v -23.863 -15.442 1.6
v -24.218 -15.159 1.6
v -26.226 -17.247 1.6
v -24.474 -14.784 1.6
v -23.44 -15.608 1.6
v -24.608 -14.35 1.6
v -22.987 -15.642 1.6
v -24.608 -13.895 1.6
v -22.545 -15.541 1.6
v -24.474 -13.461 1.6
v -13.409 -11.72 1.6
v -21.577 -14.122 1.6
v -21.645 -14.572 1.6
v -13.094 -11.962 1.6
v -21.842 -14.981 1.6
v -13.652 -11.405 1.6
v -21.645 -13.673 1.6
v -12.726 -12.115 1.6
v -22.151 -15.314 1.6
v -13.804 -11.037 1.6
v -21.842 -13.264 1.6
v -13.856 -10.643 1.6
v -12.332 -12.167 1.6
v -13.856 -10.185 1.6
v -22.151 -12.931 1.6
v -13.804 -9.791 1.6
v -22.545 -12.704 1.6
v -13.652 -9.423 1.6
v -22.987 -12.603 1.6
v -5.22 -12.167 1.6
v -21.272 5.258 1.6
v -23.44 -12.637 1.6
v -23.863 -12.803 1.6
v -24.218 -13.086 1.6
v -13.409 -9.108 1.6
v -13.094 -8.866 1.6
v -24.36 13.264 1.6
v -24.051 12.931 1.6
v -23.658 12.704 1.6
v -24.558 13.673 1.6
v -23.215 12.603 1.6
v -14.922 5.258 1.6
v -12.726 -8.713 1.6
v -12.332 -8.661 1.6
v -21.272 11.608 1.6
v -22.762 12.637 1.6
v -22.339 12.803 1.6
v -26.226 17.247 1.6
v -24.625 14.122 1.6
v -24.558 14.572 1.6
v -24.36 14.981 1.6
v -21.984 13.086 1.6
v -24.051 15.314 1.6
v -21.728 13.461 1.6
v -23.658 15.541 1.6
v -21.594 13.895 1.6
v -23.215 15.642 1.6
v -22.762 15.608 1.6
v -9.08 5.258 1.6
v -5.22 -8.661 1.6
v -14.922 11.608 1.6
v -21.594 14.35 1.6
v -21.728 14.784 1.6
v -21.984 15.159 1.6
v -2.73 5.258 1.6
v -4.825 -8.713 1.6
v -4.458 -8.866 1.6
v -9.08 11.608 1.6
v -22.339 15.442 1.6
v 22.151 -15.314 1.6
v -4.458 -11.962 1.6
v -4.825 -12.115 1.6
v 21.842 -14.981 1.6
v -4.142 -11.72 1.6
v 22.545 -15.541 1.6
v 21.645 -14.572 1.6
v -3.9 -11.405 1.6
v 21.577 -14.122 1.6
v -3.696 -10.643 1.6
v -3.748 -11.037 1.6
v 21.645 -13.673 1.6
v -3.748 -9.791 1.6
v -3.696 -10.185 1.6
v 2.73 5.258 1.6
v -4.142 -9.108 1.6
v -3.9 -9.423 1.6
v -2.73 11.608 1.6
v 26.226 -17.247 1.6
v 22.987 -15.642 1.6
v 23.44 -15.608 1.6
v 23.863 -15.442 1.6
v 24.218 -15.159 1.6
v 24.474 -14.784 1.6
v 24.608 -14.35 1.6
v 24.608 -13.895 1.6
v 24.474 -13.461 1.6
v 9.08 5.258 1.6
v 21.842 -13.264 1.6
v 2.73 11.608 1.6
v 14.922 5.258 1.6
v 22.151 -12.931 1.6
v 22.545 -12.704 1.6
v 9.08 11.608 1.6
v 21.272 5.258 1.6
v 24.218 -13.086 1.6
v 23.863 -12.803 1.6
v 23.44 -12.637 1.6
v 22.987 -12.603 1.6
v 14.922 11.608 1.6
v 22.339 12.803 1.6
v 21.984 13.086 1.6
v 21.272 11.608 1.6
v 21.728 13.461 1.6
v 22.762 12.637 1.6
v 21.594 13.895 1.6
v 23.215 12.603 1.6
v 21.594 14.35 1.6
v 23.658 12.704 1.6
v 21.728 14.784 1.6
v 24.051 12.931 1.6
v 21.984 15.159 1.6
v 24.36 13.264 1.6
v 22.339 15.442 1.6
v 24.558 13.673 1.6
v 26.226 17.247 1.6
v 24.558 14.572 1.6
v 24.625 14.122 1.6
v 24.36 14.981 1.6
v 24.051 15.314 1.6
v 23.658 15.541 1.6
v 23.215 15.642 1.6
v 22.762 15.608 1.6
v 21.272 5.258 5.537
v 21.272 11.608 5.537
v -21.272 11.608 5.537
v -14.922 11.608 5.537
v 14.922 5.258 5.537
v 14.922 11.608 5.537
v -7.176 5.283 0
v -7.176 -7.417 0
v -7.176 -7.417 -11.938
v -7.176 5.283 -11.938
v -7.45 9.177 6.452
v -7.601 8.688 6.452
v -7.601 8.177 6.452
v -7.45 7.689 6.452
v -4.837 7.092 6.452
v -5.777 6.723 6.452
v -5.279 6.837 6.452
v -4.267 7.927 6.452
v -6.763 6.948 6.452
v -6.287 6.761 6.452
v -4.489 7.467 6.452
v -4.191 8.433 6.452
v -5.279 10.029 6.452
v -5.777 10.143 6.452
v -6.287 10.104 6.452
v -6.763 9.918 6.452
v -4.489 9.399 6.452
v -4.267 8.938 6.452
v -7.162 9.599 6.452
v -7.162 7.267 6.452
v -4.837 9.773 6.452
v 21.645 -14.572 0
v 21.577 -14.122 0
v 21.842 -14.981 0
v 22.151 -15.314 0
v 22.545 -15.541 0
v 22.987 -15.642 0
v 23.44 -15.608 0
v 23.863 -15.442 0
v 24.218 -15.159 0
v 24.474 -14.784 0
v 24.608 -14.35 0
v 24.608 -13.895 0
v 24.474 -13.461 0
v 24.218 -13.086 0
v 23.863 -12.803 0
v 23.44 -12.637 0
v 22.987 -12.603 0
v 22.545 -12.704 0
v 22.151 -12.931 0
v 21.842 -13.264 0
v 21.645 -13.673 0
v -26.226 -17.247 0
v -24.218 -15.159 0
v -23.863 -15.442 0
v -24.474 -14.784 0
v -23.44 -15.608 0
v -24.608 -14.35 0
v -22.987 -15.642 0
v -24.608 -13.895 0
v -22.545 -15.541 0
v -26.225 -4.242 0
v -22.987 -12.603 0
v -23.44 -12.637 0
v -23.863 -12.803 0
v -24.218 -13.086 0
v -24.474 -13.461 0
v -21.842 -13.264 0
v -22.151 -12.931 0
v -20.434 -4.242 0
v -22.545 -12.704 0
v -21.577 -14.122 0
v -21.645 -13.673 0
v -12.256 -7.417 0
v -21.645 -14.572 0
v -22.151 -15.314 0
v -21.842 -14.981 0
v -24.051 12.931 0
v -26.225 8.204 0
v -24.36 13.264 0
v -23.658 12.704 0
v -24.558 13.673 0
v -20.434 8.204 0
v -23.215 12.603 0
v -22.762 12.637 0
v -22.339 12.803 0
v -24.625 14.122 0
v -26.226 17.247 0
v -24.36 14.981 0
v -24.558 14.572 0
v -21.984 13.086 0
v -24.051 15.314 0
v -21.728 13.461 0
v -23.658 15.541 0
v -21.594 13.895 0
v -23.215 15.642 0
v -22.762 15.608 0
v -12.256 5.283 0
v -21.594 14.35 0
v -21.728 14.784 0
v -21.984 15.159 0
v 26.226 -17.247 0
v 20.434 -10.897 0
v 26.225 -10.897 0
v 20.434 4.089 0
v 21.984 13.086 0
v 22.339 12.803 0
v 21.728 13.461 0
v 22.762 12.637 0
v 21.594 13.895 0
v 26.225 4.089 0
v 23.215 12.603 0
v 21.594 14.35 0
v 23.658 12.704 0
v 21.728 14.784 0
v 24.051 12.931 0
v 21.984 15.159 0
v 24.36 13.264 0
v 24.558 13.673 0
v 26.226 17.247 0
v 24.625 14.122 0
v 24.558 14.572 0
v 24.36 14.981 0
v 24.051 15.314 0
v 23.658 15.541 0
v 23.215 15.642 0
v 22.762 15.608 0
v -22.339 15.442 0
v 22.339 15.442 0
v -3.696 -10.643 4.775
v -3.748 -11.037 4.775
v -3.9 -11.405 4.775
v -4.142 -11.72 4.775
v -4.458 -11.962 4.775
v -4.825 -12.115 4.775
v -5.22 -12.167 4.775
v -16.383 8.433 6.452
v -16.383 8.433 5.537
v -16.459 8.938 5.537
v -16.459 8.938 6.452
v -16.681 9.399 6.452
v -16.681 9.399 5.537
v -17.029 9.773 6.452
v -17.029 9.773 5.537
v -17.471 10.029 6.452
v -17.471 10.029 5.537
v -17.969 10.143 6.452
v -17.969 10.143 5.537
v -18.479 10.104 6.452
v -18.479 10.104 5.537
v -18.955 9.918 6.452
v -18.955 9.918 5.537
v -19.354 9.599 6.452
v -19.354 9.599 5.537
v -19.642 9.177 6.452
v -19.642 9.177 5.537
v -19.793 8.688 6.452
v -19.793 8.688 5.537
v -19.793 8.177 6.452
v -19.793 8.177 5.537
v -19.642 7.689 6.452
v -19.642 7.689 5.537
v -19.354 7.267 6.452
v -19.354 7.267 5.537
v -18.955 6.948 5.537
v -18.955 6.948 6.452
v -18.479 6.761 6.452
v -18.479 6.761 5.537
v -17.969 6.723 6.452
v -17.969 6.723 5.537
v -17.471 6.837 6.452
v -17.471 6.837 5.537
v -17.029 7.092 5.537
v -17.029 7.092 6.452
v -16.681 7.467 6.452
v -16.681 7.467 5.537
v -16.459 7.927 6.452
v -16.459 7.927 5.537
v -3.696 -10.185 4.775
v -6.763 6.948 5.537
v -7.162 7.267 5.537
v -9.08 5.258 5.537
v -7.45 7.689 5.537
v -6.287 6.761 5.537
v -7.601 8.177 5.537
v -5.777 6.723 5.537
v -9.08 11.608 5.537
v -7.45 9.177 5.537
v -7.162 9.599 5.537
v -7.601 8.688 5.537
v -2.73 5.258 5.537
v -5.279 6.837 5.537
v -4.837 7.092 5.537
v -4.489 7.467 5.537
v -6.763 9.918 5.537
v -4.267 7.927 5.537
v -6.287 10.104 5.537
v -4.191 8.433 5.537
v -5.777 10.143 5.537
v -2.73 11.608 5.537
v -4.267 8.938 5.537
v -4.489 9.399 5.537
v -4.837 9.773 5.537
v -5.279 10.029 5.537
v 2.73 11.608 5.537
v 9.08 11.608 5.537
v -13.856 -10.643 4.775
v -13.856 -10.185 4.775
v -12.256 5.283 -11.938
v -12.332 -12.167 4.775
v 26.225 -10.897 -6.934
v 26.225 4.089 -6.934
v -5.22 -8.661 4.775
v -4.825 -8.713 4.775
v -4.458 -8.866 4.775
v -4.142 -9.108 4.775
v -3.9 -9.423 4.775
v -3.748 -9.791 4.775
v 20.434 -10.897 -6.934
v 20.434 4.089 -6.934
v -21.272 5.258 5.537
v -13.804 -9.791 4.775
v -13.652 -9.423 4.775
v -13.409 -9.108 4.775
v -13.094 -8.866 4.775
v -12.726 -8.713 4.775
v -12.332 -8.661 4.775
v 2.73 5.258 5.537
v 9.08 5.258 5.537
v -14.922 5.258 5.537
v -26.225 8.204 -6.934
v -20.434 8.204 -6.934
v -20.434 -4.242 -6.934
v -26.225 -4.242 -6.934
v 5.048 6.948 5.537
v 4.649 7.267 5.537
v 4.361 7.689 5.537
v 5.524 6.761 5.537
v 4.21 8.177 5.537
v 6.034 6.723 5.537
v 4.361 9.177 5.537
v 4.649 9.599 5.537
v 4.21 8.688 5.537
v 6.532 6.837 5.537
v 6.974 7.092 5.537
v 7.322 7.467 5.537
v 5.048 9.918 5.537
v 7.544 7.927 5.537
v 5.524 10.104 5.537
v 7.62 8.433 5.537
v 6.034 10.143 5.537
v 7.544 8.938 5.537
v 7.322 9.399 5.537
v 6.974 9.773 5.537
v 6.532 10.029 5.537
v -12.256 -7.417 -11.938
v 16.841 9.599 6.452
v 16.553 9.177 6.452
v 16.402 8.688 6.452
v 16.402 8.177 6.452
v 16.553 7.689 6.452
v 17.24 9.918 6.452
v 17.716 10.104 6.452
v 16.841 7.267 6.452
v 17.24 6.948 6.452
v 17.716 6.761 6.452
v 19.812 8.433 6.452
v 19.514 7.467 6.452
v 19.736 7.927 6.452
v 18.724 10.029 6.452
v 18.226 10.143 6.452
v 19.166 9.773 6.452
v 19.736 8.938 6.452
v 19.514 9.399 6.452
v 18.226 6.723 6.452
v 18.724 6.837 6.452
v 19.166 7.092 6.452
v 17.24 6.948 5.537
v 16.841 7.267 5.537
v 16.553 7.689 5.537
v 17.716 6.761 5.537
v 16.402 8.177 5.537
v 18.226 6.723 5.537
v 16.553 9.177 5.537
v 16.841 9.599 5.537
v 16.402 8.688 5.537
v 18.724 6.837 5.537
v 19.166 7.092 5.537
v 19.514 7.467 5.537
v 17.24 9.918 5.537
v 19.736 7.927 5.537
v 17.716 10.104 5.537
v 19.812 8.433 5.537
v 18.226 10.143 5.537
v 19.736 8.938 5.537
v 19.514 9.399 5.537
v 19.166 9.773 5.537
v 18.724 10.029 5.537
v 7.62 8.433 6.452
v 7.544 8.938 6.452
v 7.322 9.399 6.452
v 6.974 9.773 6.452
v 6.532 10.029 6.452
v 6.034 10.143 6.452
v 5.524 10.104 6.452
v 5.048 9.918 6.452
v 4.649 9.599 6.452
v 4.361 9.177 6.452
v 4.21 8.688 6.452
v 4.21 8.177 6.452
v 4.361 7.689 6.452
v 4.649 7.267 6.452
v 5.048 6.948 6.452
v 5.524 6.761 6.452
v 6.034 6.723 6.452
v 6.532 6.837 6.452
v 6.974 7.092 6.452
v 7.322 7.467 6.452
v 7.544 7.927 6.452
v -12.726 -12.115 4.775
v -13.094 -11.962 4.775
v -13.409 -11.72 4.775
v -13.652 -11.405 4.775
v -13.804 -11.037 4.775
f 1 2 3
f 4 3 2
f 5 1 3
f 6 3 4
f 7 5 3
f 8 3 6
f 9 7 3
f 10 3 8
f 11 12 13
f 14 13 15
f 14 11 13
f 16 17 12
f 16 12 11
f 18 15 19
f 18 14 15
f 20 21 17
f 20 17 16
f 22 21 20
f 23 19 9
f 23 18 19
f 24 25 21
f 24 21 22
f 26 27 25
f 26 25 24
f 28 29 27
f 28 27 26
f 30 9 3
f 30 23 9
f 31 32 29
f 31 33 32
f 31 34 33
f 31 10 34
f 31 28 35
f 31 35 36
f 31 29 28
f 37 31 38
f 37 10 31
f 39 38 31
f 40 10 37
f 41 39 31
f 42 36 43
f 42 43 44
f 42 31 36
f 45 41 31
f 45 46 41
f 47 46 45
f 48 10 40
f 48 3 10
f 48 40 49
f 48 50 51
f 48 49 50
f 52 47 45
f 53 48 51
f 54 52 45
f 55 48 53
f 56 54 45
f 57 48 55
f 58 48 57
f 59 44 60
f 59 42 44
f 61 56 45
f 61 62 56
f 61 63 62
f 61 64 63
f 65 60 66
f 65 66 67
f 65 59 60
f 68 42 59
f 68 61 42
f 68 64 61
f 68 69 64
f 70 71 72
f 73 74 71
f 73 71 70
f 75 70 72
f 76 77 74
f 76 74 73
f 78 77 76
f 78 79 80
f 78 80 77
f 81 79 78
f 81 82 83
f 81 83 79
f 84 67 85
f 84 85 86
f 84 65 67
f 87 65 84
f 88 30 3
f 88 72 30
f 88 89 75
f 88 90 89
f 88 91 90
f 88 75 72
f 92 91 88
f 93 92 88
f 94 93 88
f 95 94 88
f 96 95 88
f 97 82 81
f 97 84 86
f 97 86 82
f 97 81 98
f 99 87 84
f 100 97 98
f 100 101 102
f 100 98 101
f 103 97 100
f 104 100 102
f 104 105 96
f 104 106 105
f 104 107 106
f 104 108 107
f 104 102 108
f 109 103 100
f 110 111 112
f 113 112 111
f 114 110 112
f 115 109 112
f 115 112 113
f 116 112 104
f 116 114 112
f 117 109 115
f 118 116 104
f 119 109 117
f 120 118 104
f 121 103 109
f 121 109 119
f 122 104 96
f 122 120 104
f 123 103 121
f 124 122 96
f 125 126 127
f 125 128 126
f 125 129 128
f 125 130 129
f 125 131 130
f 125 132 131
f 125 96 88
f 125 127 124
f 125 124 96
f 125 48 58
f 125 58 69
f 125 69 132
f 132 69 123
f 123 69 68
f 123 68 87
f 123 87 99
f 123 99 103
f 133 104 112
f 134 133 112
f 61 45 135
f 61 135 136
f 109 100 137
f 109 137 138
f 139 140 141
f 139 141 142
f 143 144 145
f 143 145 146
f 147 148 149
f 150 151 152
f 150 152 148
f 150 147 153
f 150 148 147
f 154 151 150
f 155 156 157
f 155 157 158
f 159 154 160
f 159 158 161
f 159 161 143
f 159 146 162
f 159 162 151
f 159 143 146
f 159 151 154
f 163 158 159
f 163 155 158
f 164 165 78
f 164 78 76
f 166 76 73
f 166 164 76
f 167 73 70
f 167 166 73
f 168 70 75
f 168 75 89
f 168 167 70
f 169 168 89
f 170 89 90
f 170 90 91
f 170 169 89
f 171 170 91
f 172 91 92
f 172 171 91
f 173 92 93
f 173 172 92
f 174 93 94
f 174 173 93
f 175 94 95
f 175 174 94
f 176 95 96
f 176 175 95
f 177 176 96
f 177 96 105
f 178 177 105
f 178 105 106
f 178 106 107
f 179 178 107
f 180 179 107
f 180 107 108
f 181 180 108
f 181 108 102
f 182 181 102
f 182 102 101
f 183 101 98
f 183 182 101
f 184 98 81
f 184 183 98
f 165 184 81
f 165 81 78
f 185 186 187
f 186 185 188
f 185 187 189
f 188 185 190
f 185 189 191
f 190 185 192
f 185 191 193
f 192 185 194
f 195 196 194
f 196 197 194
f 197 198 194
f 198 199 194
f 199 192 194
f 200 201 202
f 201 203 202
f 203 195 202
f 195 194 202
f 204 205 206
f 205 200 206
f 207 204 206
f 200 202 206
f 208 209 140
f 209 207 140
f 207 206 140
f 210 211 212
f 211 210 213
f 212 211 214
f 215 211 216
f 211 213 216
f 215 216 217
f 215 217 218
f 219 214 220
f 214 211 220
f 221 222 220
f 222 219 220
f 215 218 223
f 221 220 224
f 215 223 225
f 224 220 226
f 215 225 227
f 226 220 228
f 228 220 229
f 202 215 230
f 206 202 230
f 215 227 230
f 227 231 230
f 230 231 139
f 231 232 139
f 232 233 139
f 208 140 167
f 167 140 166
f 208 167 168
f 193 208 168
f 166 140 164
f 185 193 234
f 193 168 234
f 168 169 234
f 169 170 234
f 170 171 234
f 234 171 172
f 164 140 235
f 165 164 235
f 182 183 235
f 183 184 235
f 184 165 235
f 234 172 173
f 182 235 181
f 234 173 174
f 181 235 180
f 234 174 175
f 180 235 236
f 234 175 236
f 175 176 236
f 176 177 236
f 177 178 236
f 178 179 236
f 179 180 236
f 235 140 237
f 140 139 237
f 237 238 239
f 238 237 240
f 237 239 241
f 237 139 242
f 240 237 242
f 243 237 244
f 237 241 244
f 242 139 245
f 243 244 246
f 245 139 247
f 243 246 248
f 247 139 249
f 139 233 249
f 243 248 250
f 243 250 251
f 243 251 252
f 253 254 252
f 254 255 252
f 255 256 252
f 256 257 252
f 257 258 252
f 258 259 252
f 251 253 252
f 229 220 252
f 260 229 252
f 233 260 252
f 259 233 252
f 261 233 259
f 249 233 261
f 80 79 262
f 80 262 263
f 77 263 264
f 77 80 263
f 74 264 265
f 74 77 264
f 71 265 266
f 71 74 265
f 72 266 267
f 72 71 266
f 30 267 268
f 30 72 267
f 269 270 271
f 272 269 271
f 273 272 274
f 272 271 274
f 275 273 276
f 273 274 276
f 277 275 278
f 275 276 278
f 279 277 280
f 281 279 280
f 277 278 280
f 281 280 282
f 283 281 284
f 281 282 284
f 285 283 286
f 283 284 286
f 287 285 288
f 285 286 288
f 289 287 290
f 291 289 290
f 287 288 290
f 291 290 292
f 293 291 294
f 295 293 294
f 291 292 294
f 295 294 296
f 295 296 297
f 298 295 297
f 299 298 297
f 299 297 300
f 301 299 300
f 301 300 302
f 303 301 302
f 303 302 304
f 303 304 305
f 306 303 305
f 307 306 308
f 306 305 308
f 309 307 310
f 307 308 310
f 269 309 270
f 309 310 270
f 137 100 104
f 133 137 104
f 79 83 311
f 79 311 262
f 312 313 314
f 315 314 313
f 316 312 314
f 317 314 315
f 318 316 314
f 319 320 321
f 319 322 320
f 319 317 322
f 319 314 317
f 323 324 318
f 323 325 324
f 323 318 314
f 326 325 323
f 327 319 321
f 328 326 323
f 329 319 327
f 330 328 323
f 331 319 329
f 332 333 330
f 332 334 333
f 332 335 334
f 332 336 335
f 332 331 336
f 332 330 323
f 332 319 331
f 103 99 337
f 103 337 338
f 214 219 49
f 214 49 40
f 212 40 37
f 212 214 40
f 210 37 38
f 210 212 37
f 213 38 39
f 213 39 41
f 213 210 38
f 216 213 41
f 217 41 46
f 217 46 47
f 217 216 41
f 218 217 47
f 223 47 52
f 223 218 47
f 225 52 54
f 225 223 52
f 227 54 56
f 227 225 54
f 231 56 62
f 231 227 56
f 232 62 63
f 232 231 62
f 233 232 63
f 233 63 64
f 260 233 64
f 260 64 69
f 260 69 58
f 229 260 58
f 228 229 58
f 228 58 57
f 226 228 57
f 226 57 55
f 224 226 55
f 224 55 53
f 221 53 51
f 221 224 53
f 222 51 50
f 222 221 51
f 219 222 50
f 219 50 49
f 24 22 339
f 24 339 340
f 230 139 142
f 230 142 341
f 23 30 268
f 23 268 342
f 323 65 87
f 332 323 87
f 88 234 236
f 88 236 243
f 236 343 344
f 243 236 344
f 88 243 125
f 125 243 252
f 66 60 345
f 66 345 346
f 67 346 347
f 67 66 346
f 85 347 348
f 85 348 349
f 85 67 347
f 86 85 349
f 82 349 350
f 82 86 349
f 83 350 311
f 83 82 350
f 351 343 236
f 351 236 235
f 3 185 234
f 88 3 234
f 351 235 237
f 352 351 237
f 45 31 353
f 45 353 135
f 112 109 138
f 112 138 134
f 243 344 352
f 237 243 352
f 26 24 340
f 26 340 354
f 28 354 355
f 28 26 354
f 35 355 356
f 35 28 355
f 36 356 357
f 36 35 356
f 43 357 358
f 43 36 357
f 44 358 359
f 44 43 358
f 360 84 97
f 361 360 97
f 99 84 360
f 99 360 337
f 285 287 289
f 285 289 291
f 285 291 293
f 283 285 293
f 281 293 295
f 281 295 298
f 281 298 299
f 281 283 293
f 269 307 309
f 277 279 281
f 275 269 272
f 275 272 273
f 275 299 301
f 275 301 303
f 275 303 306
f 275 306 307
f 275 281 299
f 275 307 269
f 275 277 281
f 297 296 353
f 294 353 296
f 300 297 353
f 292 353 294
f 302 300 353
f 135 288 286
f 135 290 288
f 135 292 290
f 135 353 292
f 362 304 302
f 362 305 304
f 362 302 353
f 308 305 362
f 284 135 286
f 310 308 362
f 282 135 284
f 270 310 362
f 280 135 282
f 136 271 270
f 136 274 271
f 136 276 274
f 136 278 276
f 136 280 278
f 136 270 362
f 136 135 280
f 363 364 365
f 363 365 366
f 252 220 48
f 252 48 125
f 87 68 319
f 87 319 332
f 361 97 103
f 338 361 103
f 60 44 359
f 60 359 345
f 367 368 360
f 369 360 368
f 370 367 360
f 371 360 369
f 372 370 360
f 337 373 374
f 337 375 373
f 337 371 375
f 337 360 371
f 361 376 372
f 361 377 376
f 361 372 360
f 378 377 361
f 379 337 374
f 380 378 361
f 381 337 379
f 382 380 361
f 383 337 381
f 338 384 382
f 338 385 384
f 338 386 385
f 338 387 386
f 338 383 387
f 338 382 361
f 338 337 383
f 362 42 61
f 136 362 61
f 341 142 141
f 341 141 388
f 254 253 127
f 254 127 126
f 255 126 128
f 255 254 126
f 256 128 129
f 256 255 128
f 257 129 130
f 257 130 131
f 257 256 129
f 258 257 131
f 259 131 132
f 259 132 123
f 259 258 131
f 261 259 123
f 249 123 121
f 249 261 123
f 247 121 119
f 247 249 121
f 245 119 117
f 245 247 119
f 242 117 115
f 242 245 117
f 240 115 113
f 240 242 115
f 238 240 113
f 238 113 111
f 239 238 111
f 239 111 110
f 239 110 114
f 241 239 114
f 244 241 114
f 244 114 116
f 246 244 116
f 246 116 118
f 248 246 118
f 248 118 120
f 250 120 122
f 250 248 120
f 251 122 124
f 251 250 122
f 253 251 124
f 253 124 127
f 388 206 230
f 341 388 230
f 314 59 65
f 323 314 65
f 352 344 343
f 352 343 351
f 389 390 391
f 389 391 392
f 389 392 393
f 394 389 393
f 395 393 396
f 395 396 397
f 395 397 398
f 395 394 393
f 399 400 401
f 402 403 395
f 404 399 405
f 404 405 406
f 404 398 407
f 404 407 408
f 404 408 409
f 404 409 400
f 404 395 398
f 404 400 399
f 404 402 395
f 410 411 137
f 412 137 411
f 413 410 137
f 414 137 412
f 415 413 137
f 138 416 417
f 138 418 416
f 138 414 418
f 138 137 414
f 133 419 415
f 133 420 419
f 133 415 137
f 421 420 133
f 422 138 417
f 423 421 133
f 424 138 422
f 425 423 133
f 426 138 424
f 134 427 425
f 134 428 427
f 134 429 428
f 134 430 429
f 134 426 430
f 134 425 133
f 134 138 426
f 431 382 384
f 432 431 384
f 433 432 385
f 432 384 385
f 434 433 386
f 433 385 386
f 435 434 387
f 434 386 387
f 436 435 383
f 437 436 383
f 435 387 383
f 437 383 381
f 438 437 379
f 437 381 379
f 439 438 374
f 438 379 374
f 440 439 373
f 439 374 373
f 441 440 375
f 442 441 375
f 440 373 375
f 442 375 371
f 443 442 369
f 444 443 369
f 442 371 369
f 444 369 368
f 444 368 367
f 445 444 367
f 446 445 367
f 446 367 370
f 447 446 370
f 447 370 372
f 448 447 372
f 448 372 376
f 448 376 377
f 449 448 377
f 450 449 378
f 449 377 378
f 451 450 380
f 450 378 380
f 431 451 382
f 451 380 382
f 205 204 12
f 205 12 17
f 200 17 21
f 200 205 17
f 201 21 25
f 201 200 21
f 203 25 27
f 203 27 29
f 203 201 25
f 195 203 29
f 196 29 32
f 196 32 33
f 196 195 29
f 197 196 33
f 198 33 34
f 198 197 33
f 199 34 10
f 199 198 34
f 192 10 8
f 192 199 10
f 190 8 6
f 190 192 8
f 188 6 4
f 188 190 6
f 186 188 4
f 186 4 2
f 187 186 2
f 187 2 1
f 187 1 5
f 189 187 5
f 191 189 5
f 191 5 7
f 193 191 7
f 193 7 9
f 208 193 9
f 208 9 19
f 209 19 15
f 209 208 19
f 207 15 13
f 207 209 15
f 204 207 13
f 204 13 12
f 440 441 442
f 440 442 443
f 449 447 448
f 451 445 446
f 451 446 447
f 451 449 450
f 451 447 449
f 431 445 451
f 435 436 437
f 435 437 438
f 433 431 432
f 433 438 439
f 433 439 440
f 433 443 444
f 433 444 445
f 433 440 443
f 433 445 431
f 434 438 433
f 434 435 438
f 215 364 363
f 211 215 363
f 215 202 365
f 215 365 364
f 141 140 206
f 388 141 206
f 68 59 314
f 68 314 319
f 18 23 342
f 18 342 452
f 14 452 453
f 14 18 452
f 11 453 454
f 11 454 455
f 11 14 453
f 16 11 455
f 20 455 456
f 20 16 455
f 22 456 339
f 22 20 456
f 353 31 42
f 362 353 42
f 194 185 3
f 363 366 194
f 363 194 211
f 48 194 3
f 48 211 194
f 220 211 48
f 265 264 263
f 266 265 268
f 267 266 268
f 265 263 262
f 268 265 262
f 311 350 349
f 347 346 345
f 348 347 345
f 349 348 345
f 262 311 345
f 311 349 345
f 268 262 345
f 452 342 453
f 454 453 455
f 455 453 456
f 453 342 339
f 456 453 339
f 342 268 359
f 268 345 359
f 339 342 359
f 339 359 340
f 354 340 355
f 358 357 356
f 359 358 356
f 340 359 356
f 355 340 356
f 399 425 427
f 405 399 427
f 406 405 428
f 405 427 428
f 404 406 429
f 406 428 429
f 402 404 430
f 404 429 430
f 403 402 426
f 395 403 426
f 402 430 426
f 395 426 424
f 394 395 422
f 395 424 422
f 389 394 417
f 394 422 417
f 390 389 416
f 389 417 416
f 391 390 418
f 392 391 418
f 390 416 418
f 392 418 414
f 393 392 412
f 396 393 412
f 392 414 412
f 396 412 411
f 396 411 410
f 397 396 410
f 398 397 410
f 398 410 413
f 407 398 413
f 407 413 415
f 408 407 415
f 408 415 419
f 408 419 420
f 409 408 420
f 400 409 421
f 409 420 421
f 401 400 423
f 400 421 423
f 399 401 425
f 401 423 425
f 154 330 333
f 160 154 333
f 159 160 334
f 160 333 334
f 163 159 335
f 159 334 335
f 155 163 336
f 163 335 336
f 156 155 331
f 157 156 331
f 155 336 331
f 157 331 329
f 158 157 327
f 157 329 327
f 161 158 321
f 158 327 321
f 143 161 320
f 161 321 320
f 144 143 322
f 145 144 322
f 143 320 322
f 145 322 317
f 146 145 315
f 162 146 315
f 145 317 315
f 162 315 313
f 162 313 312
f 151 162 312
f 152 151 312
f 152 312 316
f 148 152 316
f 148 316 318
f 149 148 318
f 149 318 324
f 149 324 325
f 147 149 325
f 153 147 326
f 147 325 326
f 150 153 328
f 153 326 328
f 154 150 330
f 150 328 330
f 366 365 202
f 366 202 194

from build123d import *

# Parameters (mm, degrees)
SKETCH1_W           = 52.451
SKETCH1_H           = 34.4932
SKETCH1_R           = 1.524
BOSS_EXTRUDE1_DEPTH = 1.6002
SKETCH2_W           = 6.35
SKETCH2_H           = 6.35
BOSS_EXTRUDE2_DEPTH = 3.937
BOSS_EXTRUDE3_DEPTH = 3.175
SKETCH4_W           = 5.7912
SKETCH4_H           = 14.986
SKETCH4_H_2         = 12.446
BOSS_EXTRUDE4_DEPTH = 6.9342
SKETCH5_W           = 5.08
SKETCH5_H           = 12.7
BOSS_EXTRUDE5_DEPTH = 11.938
SKETCH6_R           = 1.7145
BOSS_EXTRUDE6_DEPTH = 0.9144


with BuildPart() as part:
    # Sketch1 → Boss-Extrude1 (new body)
    with BuildSketch(Plane.XY):
        Rectangle(SKETCH1_W, SKETCH1_H)
        with Locations((23.1013, 14.1224)):
            Circle(SKETCH1_R, mode=Mode.SUBTRACT)
        with Locations(Location((23.1013, -14.1224, 0), (0, 0, 180))):
            Circle(SKETCH1_R, mode=Mode.SUBTRACT)
        with Locations((-23.1013, -14.1224)):
            Circle(SKETCH1_R, mode=Mode.SUBTRACT)
        with Locations(Location((-23.1013, 14.1224, 0), (0, 0, 180))):
            Circle(SKETCH1_R, mode=Mode.SUBTRACT)
    extrude(amount=BOSS_EXTRUDE1_DEPTH)

    # Sketch2 → Boss-Extrude2 (add)
    with BuildSketch(Plane.XY.offset(1.6002)):
        with Locations((-18.0975, 8.4328)):
            Rectangle(SKETCH2_W, SKETCH2_H)
        with Locations((-5.9055, 8.4328)):
            Rectangle(SKETCH2_W, SKETCH2_H)
        with Locations((18.0975, 8.4328)):
            Rectangle(SKETCH2_W, SKETCH2_H)
        with Locations((5.9055, 8.4328)):
            Rectangle(SKETCH2_W, SKETCH2_H)
    extrude(amount=BOSS_EXTRUDE2_DEPTH)

    # Sketch3 → Boss-Extrude3 (add)
    with BuildSketch(Plane.XY.offset(1.6002)):
        with BuildLine():
            Line((-12.3317, -8.6614), (-5.2197, -8.6614))
            ThreePointArc((-5.2197, -8.6614), (-4.142069265, -9.107769265), (-3.6957, -10.1854))
            Line((-3.6957, -10.1854), (-3.6957, -10.6426))
            ThreePointArc((-3.6957, -10.6426), (-4.142069265, -11.720230735), (-5.2197, -12.1666))
            Line((-5.2197, -12.1666), (-12.3317, -12.1666))
            ThreePointArc((-12.3317, -12.1666), (-13.409330735, -11.720230735), (-13.8557, -10.6426))
            Line((-13.8557, -10.6426), (-13.8557, -10.1854))
            ThreePointArc((-13.8557, -10.1854), (-13.409330735, -9.107769265), (-12.3317, -8.6614))
        make_face()
    extrude(amount=BOSS_EXTRUDE3_DEPTH)

    # Sketch4 → Boss-Extrude4 (add)
    with BuildSketch(Plane(origin=(0, 0, 0), x_dir=(-1, 0, 0), z_dir=(0, 0, -1))):
        with Locations((-23.3299, -3.4036)):
            Rectangle(SKETCH4_W, SKETCH4_H)
        with Locations((23.3299, 1.9812)):
            Rectangle(SKETCH4_W, SKETCH4_H_2)
    extrude(amount=BOSS_EXTRUDE4_DEPTH)

    # Sketch5 → Boss-Extrude5 (add)
    with BuildSketch(Plane(origin=(0, 0, 0), x_dir=(-1, 0, 0), z_dir=(0, 0, -1))):
        with Locations((9.7155, -1.0668)):
            Rectangle(SKETCH5_W, SKETCH5_H)
    extrude(amount=BOSS_EXTRUDE5_DEPTH)

    # Sketch6 → Boss-Extrude6 (add)
    with BuildSketch(Plane.XY.offset(5.5372)):
        with Locations((-18.0975, 8.4328)):
            Circle(SKETCH6_R)
        with Locations((-5.9055, 8.4328)):
            Circle(SKETCH6_R)
        with Locations((5.9055, 8.4328)):
            Circle(SKETCH6_R)
        with Locations((18.0975, 8.4328)):
            Circle(SKETCH6_R)
    extrude(amount=BOSS_EXTRUDE6_DEPTH)


solid = part.part
